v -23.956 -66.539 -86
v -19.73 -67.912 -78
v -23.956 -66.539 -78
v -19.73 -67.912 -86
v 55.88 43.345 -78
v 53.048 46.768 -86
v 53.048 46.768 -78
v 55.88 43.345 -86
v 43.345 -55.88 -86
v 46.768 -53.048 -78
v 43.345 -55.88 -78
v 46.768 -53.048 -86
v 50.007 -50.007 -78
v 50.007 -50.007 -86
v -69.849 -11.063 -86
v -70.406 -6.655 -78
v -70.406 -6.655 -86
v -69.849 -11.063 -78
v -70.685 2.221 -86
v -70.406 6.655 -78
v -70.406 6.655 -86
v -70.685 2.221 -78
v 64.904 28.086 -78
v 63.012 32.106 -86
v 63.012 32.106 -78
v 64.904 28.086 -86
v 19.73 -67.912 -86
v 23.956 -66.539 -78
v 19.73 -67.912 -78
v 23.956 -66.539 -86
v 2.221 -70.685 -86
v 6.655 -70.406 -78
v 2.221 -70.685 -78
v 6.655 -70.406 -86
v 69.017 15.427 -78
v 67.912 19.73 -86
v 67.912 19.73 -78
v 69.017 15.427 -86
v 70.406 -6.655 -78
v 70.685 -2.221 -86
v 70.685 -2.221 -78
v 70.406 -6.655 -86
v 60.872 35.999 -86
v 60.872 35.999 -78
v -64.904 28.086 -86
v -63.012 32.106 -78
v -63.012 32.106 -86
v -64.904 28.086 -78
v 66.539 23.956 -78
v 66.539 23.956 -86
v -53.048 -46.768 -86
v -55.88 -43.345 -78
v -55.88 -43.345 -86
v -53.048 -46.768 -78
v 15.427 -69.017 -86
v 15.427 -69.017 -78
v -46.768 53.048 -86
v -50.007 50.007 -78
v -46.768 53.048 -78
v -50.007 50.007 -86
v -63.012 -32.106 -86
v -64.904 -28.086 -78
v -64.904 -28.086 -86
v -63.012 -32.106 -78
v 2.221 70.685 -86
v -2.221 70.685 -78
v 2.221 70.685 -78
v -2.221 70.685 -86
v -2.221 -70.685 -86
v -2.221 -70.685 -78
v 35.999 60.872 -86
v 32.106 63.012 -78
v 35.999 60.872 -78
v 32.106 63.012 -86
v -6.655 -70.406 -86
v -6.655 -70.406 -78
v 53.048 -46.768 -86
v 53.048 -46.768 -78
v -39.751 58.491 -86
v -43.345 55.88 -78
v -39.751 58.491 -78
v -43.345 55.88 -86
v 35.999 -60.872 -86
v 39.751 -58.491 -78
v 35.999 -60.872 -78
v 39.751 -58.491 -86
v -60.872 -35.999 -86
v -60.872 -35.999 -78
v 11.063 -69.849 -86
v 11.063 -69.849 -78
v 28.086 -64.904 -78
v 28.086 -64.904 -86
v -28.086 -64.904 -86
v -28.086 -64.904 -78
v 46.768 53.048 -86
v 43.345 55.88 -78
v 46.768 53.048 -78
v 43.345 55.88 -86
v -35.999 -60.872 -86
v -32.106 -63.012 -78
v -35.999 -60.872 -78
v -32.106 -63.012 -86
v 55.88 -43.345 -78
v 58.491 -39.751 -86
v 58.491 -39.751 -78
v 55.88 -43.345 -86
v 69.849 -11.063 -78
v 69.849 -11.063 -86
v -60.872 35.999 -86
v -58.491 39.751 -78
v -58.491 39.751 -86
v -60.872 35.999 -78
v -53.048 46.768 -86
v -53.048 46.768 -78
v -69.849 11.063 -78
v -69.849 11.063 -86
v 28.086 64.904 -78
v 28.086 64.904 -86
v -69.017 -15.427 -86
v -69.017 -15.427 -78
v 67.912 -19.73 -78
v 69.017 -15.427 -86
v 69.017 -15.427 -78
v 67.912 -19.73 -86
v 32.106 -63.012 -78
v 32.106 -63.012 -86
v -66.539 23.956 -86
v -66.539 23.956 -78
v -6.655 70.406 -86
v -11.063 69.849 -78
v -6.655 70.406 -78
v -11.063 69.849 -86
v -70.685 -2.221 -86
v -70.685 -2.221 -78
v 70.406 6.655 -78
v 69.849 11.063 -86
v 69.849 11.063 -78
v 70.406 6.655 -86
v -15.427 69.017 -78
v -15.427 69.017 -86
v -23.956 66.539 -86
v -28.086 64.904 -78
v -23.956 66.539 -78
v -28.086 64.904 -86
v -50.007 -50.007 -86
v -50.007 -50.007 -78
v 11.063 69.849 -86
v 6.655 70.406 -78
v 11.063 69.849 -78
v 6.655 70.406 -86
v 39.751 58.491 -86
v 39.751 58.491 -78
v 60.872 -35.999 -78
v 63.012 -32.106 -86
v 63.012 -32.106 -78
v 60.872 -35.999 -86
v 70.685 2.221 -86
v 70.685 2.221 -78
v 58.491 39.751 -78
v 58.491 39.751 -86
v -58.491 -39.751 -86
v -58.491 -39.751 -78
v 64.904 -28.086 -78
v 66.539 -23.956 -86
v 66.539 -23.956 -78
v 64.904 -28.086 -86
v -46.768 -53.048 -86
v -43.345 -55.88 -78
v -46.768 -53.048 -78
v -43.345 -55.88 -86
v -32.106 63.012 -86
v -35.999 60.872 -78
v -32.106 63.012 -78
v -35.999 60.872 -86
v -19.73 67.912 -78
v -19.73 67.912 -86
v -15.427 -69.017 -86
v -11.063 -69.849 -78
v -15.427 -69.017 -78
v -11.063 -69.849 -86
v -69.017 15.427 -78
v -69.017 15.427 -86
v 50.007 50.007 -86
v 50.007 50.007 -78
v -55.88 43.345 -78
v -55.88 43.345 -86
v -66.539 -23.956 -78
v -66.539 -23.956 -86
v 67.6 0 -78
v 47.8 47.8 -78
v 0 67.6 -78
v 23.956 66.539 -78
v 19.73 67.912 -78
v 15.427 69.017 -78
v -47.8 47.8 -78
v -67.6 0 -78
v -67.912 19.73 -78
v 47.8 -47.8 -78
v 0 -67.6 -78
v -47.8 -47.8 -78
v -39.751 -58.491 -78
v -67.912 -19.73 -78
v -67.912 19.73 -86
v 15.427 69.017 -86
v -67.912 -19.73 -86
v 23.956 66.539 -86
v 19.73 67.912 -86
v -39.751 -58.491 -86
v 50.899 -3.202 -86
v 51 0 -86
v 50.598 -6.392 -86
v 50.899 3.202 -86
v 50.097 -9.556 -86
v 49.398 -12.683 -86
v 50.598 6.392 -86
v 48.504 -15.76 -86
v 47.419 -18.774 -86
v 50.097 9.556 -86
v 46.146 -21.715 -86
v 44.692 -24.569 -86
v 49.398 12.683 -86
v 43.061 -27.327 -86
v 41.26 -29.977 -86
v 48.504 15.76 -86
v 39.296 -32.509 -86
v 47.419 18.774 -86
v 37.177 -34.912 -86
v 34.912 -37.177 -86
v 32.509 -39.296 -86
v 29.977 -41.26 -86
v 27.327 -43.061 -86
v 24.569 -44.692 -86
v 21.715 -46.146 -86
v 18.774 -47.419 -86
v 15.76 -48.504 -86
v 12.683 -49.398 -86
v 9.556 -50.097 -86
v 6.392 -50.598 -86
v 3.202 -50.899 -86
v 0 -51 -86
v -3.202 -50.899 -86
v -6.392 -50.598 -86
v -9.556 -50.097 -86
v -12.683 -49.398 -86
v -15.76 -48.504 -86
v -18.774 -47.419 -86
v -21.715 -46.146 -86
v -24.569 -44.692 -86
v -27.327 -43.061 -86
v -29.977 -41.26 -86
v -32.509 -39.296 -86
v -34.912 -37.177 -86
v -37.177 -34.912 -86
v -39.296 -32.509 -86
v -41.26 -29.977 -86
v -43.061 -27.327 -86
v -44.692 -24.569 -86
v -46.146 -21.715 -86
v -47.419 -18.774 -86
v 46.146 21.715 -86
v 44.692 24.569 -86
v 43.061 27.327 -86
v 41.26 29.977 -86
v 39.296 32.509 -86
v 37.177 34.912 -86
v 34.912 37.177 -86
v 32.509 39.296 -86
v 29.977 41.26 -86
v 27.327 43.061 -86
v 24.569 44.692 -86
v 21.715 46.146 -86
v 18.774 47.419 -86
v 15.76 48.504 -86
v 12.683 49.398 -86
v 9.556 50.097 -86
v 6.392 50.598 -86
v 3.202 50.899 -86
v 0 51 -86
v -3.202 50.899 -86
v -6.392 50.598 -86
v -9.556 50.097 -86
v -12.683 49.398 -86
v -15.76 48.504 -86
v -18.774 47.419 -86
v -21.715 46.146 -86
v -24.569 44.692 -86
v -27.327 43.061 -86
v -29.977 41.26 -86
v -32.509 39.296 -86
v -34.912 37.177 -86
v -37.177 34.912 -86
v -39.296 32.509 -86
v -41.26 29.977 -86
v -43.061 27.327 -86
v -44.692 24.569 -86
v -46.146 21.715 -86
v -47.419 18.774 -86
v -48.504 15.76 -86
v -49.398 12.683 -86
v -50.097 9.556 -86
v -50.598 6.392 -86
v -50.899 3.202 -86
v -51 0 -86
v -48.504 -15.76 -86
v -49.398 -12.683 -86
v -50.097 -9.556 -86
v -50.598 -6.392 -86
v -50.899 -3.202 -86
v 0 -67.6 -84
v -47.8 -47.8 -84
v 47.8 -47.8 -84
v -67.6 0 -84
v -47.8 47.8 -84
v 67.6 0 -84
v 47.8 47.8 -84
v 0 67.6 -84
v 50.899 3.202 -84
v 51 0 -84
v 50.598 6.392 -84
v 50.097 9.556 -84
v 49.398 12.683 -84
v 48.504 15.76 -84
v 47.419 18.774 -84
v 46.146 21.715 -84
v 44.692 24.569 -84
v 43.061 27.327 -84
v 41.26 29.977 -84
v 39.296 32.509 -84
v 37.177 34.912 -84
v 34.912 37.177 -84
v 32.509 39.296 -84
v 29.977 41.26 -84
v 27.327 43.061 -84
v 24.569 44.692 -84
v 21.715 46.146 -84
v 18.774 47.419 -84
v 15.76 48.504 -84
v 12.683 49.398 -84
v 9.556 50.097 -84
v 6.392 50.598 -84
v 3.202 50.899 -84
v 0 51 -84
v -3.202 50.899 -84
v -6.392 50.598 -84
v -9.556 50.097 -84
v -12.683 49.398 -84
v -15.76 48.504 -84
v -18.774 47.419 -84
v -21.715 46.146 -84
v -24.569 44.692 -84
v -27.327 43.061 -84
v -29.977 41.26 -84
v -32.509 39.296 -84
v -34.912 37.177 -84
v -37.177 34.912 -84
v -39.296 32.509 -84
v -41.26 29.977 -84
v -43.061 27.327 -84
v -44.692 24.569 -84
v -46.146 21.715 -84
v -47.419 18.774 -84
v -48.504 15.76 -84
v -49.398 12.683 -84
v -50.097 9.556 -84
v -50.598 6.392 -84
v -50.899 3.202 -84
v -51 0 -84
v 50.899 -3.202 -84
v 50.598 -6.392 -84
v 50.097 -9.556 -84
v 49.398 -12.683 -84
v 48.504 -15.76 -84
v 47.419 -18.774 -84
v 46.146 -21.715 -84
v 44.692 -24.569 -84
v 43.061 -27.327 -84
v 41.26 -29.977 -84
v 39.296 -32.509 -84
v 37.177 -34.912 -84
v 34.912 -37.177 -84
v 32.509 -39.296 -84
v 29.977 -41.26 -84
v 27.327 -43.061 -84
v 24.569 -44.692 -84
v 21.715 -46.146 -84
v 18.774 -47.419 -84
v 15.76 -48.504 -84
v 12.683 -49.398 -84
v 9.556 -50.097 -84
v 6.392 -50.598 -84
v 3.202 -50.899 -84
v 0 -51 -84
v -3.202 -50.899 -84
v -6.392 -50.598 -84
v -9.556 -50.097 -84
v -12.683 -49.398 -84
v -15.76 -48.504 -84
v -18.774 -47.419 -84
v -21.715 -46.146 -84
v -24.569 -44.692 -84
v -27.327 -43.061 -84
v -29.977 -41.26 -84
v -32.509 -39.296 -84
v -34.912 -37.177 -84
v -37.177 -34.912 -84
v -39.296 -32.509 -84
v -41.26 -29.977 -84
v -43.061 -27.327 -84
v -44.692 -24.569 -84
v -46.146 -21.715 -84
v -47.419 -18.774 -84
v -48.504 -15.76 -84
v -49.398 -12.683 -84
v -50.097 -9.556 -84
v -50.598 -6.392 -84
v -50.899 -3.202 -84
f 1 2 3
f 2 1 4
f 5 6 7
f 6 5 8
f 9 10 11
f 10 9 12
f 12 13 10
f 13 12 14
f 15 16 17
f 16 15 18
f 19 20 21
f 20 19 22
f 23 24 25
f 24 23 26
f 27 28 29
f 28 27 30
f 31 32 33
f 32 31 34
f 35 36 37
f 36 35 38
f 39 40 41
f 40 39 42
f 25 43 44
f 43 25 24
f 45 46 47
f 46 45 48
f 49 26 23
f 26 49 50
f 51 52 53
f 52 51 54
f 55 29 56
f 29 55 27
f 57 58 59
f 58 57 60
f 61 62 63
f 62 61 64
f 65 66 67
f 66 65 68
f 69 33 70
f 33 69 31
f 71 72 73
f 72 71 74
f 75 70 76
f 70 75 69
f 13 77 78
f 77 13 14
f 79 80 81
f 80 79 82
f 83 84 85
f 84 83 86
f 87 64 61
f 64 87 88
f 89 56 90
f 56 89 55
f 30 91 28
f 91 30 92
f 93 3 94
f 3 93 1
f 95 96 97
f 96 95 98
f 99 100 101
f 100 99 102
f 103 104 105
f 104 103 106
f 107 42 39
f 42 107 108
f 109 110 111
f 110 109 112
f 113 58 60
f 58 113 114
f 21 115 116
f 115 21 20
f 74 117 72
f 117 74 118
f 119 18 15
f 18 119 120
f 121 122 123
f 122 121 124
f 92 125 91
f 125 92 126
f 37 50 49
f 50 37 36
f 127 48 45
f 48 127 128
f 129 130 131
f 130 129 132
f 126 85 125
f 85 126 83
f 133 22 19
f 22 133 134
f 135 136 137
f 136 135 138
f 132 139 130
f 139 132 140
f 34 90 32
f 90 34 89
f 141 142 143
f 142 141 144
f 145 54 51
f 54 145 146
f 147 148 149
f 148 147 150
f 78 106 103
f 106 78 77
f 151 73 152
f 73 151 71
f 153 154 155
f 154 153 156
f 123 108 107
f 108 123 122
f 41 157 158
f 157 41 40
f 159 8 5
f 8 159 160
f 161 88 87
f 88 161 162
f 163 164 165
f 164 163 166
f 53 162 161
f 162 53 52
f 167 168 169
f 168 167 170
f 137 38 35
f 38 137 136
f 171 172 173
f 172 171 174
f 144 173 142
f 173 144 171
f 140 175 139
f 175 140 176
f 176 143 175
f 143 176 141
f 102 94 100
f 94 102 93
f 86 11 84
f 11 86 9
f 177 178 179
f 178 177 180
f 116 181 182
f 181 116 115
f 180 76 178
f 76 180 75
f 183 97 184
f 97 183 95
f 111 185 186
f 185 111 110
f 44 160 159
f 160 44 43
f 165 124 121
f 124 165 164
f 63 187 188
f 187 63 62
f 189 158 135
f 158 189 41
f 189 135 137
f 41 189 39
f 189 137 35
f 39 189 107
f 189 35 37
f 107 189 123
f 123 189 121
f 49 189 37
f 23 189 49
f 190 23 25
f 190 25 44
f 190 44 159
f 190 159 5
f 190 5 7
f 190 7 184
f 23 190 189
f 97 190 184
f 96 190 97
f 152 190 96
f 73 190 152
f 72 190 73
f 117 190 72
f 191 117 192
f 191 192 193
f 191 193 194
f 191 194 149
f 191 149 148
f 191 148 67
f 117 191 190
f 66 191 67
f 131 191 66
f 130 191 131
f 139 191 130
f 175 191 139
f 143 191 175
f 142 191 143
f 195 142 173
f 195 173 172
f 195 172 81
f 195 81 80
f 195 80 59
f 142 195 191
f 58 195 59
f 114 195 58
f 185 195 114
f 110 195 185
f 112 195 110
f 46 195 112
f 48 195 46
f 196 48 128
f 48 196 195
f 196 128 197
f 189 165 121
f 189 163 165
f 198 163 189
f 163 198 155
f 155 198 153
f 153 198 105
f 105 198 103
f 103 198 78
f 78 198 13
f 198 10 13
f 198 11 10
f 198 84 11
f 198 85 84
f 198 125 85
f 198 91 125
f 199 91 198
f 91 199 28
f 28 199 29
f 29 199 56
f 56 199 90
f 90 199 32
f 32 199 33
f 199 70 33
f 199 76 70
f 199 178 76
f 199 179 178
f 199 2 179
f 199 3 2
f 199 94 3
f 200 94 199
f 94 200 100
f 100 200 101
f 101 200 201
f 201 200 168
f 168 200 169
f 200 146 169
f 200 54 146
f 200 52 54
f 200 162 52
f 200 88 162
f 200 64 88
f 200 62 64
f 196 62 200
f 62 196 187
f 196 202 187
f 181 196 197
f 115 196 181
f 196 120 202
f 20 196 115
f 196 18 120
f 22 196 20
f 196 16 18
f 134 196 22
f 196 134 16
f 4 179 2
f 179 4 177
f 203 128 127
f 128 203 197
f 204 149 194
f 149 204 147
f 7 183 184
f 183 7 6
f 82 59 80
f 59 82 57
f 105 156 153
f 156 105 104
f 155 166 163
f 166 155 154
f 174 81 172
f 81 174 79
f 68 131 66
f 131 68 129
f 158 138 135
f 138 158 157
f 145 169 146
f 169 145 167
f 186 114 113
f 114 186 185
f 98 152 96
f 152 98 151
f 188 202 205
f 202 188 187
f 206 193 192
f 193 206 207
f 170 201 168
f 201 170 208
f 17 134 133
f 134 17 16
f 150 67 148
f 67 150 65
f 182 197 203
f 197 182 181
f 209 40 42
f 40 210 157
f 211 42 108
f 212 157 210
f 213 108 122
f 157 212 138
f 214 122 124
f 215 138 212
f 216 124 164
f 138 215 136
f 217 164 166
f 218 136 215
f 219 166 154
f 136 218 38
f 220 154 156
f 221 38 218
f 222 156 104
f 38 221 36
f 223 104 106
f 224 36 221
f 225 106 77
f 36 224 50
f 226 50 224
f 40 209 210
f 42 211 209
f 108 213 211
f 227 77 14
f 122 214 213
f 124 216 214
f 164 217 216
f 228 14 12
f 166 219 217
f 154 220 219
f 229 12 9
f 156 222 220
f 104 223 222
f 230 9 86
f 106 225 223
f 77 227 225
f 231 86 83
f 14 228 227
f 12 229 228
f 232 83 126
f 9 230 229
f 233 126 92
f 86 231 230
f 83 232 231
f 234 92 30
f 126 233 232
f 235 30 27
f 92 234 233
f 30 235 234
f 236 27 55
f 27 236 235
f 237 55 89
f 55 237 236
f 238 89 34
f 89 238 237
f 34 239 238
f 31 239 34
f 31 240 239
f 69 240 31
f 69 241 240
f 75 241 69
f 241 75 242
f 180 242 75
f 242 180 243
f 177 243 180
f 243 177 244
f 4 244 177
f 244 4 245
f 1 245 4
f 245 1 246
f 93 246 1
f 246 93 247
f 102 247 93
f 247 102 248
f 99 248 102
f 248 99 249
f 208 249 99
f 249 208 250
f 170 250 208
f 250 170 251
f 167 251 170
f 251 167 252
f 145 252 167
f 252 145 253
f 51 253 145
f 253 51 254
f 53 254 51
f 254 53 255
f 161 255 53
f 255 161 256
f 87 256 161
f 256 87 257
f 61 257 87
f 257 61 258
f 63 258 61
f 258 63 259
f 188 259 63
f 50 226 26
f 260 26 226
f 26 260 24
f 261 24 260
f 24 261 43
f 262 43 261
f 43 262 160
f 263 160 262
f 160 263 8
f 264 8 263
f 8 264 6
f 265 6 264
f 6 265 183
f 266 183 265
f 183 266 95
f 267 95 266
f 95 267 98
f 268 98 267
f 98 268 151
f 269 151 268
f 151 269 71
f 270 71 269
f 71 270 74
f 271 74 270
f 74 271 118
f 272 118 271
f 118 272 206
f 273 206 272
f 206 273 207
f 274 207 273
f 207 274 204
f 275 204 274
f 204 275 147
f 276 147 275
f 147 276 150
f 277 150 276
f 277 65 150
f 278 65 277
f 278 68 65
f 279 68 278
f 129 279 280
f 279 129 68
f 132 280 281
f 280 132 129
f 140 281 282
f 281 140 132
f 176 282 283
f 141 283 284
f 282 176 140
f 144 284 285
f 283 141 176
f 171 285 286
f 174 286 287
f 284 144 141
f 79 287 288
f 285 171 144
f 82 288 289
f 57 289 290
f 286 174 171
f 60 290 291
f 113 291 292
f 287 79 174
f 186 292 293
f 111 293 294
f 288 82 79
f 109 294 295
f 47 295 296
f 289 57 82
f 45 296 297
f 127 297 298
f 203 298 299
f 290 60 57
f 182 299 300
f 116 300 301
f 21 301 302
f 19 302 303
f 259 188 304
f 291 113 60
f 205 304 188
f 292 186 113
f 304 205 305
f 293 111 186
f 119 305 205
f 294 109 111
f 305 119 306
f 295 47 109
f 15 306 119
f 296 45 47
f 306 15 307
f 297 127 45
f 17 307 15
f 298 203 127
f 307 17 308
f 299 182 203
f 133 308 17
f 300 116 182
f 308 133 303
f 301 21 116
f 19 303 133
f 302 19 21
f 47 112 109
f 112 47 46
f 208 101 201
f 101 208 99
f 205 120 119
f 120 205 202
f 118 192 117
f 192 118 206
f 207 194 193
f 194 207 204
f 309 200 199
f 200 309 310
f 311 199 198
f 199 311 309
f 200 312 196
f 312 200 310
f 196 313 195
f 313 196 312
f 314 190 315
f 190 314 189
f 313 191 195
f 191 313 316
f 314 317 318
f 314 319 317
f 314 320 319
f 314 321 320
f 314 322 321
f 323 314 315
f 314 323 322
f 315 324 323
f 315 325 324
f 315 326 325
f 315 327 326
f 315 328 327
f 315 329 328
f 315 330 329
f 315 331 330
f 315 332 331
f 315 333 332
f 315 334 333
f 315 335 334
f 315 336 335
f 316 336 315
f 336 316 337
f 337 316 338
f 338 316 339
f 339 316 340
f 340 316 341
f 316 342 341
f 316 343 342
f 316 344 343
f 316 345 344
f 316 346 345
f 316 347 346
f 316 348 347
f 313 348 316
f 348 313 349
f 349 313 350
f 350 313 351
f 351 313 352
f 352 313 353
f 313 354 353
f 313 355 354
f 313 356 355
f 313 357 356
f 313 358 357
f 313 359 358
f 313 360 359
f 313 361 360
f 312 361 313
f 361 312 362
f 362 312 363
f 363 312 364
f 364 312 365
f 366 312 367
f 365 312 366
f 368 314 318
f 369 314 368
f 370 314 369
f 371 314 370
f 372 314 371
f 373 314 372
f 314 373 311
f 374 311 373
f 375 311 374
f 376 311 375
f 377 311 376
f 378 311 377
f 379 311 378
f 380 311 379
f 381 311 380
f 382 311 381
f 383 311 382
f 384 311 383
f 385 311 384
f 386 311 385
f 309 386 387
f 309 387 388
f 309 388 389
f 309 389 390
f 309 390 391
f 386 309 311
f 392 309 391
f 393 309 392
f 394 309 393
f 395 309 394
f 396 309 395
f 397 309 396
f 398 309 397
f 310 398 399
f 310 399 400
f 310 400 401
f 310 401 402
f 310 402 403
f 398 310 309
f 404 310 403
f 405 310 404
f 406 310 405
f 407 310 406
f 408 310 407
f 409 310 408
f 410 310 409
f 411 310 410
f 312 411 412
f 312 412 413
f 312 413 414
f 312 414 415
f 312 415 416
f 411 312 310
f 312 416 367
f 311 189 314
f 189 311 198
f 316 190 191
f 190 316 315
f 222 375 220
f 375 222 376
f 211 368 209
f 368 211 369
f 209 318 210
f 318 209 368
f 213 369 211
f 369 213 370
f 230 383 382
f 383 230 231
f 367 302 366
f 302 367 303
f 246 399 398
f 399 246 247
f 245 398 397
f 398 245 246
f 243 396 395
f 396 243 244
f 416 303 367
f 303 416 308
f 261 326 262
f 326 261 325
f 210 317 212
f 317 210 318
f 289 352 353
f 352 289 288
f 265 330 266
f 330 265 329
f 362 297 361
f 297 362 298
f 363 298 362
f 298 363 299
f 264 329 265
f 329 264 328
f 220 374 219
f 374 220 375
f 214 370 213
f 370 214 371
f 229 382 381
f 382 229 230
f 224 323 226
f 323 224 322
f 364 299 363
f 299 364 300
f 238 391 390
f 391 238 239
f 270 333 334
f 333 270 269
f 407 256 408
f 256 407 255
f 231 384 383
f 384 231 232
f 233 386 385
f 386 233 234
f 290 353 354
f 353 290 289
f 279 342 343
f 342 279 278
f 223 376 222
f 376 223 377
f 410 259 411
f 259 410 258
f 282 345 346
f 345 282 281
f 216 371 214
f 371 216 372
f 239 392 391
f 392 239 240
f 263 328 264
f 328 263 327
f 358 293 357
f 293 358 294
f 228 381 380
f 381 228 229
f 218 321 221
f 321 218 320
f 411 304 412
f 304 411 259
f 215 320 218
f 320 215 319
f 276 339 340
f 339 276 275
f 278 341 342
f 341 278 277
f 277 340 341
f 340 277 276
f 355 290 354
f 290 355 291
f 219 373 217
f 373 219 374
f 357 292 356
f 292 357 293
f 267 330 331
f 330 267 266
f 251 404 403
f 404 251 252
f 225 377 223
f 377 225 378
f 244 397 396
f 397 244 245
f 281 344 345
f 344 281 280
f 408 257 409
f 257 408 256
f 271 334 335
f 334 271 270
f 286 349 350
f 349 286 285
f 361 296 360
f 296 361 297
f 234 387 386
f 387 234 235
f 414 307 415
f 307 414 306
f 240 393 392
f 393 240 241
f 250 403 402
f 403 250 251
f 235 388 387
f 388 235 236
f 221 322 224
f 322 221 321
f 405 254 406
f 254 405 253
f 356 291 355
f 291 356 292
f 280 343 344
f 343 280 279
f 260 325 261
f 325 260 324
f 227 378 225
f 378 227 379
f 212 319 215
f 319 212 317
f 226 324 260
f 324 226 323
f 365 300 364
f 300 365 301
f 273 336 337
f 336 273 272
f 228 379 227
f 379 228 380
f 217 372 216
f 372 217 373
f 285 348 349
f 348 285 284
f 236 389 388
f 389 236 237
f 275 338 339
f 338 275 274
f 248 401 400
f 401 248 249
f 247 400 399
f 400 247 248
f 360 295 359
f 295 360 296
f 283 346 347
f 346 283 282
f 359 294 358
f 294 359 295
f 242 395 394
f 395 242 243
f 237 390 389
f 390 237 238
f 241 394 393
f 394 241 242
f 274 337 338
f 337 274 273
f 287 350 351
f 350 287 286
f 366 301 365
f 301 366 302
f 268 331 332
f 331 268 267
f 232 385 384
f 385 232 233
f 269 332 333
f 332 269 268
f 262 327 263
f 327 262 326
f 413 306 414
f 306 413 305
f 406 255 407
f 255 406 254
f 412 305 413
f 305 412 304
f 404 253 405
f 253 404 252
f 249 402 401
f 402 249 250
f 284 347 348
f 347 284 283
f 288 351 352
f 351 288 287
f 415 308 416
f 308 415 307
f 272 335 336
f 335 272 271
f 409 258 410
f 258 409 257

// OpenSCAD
$fn=100;

db= 80;     // diameter base
dt= 104;    // diameter top
h= 70;      // height
s= 8;       // sides
b=12;       // borda
u=96;
//---------------------------------
ir=4;
ns=4;
bt=4;       // base thickness
bs=10;      // base space
a=360/s/ir; // angle
vh=h+bt+bs; // vase height
sh=vh/ns;   // steps height

d=db*1.3;
du=dt*1.3;
sd=(du-d)/(vh/sh);
st=vh/sh;
c=15;
th=8;   //top height

/* vase *
%translate([0,0,bt+bs])
cylinder(d1=db, d2=dt, h=h);
/**/
rotate([180,0,0]) 
//vase_top();
vase_top_circle();
//vase();
//cap();

module cap(){
    difference(){
        union(){
            cylinder(d=28, h=2);
            
            translate([0,0,2])
            cylinder(d=23.5, h=5);
        }        

        translate([0,0,2])
        cylinder(d=19.64, h=10);
    }    
}

module vase_top(){
    difference(){
        translate([0,0,st*sh-(th-2)])
        rotate([0,0,st*a])
        cylinder(d=d+st*sd*1.2, h=th, $fn=s);

        translate([0,0,st*sh-(th-2)-2])
        rotate([0,0,st*a])
        cylinder(d=d+st*sd, h=th, $fn=s);
        
        translate([0,0,vh-b])
        cylinder(d=dt-2, h=vh);
        
    }
}
module vase_top_circle(){
    difference(){
        translate([0,0,st*sh-(th-2)])
        rotate([0,0,st*a])
        cylinder(d=d+st*sd*1.2, h=th);

        translate([0,0,st*sh-(th-2)-2])
        rotate([0,0,st*a])
        cylinder(d=d+st*sd, h=th, $fn=s);
        
        translate([0,0,vh-b])
        cylinder(d=dt-2, h=vh);
        
    }
}

module vase(){
    color("white")
    difference(){
        for(i=[1:st]){
            hull(){
                translate([0,0,i*sh])
                rotate([0,0,i*a])
                cylinder(d=d+i*sd, h=.1, $fn=s);

                translate([0,0,(i-1)*sh])
                rotate([0,0,(i-1)*a])
                cylinder(d=d+(i-1)*sd, h=.1, $fn=s);
            }
        }

        translate([0,0,bt])
        cylinder(d1=db-10, d2=db, h=vh);

        translate([0,0,bt+bs])
        cylinder(d=u, h=vh);

        translate([0,0,vh-b])
        cylinder(d=dt, h=vh);
        
        // chanel
        hull(){
            translate([0,-(db-17)/2,bt])
            cylinder(d=c*2, h=1);
            
            translate([0,-(db-25),vh])
            cylinder(d=c, h=1);

            translate([-c/2,-(db-25),vh])
            cube([c,c,1]);
        }
    }
}
